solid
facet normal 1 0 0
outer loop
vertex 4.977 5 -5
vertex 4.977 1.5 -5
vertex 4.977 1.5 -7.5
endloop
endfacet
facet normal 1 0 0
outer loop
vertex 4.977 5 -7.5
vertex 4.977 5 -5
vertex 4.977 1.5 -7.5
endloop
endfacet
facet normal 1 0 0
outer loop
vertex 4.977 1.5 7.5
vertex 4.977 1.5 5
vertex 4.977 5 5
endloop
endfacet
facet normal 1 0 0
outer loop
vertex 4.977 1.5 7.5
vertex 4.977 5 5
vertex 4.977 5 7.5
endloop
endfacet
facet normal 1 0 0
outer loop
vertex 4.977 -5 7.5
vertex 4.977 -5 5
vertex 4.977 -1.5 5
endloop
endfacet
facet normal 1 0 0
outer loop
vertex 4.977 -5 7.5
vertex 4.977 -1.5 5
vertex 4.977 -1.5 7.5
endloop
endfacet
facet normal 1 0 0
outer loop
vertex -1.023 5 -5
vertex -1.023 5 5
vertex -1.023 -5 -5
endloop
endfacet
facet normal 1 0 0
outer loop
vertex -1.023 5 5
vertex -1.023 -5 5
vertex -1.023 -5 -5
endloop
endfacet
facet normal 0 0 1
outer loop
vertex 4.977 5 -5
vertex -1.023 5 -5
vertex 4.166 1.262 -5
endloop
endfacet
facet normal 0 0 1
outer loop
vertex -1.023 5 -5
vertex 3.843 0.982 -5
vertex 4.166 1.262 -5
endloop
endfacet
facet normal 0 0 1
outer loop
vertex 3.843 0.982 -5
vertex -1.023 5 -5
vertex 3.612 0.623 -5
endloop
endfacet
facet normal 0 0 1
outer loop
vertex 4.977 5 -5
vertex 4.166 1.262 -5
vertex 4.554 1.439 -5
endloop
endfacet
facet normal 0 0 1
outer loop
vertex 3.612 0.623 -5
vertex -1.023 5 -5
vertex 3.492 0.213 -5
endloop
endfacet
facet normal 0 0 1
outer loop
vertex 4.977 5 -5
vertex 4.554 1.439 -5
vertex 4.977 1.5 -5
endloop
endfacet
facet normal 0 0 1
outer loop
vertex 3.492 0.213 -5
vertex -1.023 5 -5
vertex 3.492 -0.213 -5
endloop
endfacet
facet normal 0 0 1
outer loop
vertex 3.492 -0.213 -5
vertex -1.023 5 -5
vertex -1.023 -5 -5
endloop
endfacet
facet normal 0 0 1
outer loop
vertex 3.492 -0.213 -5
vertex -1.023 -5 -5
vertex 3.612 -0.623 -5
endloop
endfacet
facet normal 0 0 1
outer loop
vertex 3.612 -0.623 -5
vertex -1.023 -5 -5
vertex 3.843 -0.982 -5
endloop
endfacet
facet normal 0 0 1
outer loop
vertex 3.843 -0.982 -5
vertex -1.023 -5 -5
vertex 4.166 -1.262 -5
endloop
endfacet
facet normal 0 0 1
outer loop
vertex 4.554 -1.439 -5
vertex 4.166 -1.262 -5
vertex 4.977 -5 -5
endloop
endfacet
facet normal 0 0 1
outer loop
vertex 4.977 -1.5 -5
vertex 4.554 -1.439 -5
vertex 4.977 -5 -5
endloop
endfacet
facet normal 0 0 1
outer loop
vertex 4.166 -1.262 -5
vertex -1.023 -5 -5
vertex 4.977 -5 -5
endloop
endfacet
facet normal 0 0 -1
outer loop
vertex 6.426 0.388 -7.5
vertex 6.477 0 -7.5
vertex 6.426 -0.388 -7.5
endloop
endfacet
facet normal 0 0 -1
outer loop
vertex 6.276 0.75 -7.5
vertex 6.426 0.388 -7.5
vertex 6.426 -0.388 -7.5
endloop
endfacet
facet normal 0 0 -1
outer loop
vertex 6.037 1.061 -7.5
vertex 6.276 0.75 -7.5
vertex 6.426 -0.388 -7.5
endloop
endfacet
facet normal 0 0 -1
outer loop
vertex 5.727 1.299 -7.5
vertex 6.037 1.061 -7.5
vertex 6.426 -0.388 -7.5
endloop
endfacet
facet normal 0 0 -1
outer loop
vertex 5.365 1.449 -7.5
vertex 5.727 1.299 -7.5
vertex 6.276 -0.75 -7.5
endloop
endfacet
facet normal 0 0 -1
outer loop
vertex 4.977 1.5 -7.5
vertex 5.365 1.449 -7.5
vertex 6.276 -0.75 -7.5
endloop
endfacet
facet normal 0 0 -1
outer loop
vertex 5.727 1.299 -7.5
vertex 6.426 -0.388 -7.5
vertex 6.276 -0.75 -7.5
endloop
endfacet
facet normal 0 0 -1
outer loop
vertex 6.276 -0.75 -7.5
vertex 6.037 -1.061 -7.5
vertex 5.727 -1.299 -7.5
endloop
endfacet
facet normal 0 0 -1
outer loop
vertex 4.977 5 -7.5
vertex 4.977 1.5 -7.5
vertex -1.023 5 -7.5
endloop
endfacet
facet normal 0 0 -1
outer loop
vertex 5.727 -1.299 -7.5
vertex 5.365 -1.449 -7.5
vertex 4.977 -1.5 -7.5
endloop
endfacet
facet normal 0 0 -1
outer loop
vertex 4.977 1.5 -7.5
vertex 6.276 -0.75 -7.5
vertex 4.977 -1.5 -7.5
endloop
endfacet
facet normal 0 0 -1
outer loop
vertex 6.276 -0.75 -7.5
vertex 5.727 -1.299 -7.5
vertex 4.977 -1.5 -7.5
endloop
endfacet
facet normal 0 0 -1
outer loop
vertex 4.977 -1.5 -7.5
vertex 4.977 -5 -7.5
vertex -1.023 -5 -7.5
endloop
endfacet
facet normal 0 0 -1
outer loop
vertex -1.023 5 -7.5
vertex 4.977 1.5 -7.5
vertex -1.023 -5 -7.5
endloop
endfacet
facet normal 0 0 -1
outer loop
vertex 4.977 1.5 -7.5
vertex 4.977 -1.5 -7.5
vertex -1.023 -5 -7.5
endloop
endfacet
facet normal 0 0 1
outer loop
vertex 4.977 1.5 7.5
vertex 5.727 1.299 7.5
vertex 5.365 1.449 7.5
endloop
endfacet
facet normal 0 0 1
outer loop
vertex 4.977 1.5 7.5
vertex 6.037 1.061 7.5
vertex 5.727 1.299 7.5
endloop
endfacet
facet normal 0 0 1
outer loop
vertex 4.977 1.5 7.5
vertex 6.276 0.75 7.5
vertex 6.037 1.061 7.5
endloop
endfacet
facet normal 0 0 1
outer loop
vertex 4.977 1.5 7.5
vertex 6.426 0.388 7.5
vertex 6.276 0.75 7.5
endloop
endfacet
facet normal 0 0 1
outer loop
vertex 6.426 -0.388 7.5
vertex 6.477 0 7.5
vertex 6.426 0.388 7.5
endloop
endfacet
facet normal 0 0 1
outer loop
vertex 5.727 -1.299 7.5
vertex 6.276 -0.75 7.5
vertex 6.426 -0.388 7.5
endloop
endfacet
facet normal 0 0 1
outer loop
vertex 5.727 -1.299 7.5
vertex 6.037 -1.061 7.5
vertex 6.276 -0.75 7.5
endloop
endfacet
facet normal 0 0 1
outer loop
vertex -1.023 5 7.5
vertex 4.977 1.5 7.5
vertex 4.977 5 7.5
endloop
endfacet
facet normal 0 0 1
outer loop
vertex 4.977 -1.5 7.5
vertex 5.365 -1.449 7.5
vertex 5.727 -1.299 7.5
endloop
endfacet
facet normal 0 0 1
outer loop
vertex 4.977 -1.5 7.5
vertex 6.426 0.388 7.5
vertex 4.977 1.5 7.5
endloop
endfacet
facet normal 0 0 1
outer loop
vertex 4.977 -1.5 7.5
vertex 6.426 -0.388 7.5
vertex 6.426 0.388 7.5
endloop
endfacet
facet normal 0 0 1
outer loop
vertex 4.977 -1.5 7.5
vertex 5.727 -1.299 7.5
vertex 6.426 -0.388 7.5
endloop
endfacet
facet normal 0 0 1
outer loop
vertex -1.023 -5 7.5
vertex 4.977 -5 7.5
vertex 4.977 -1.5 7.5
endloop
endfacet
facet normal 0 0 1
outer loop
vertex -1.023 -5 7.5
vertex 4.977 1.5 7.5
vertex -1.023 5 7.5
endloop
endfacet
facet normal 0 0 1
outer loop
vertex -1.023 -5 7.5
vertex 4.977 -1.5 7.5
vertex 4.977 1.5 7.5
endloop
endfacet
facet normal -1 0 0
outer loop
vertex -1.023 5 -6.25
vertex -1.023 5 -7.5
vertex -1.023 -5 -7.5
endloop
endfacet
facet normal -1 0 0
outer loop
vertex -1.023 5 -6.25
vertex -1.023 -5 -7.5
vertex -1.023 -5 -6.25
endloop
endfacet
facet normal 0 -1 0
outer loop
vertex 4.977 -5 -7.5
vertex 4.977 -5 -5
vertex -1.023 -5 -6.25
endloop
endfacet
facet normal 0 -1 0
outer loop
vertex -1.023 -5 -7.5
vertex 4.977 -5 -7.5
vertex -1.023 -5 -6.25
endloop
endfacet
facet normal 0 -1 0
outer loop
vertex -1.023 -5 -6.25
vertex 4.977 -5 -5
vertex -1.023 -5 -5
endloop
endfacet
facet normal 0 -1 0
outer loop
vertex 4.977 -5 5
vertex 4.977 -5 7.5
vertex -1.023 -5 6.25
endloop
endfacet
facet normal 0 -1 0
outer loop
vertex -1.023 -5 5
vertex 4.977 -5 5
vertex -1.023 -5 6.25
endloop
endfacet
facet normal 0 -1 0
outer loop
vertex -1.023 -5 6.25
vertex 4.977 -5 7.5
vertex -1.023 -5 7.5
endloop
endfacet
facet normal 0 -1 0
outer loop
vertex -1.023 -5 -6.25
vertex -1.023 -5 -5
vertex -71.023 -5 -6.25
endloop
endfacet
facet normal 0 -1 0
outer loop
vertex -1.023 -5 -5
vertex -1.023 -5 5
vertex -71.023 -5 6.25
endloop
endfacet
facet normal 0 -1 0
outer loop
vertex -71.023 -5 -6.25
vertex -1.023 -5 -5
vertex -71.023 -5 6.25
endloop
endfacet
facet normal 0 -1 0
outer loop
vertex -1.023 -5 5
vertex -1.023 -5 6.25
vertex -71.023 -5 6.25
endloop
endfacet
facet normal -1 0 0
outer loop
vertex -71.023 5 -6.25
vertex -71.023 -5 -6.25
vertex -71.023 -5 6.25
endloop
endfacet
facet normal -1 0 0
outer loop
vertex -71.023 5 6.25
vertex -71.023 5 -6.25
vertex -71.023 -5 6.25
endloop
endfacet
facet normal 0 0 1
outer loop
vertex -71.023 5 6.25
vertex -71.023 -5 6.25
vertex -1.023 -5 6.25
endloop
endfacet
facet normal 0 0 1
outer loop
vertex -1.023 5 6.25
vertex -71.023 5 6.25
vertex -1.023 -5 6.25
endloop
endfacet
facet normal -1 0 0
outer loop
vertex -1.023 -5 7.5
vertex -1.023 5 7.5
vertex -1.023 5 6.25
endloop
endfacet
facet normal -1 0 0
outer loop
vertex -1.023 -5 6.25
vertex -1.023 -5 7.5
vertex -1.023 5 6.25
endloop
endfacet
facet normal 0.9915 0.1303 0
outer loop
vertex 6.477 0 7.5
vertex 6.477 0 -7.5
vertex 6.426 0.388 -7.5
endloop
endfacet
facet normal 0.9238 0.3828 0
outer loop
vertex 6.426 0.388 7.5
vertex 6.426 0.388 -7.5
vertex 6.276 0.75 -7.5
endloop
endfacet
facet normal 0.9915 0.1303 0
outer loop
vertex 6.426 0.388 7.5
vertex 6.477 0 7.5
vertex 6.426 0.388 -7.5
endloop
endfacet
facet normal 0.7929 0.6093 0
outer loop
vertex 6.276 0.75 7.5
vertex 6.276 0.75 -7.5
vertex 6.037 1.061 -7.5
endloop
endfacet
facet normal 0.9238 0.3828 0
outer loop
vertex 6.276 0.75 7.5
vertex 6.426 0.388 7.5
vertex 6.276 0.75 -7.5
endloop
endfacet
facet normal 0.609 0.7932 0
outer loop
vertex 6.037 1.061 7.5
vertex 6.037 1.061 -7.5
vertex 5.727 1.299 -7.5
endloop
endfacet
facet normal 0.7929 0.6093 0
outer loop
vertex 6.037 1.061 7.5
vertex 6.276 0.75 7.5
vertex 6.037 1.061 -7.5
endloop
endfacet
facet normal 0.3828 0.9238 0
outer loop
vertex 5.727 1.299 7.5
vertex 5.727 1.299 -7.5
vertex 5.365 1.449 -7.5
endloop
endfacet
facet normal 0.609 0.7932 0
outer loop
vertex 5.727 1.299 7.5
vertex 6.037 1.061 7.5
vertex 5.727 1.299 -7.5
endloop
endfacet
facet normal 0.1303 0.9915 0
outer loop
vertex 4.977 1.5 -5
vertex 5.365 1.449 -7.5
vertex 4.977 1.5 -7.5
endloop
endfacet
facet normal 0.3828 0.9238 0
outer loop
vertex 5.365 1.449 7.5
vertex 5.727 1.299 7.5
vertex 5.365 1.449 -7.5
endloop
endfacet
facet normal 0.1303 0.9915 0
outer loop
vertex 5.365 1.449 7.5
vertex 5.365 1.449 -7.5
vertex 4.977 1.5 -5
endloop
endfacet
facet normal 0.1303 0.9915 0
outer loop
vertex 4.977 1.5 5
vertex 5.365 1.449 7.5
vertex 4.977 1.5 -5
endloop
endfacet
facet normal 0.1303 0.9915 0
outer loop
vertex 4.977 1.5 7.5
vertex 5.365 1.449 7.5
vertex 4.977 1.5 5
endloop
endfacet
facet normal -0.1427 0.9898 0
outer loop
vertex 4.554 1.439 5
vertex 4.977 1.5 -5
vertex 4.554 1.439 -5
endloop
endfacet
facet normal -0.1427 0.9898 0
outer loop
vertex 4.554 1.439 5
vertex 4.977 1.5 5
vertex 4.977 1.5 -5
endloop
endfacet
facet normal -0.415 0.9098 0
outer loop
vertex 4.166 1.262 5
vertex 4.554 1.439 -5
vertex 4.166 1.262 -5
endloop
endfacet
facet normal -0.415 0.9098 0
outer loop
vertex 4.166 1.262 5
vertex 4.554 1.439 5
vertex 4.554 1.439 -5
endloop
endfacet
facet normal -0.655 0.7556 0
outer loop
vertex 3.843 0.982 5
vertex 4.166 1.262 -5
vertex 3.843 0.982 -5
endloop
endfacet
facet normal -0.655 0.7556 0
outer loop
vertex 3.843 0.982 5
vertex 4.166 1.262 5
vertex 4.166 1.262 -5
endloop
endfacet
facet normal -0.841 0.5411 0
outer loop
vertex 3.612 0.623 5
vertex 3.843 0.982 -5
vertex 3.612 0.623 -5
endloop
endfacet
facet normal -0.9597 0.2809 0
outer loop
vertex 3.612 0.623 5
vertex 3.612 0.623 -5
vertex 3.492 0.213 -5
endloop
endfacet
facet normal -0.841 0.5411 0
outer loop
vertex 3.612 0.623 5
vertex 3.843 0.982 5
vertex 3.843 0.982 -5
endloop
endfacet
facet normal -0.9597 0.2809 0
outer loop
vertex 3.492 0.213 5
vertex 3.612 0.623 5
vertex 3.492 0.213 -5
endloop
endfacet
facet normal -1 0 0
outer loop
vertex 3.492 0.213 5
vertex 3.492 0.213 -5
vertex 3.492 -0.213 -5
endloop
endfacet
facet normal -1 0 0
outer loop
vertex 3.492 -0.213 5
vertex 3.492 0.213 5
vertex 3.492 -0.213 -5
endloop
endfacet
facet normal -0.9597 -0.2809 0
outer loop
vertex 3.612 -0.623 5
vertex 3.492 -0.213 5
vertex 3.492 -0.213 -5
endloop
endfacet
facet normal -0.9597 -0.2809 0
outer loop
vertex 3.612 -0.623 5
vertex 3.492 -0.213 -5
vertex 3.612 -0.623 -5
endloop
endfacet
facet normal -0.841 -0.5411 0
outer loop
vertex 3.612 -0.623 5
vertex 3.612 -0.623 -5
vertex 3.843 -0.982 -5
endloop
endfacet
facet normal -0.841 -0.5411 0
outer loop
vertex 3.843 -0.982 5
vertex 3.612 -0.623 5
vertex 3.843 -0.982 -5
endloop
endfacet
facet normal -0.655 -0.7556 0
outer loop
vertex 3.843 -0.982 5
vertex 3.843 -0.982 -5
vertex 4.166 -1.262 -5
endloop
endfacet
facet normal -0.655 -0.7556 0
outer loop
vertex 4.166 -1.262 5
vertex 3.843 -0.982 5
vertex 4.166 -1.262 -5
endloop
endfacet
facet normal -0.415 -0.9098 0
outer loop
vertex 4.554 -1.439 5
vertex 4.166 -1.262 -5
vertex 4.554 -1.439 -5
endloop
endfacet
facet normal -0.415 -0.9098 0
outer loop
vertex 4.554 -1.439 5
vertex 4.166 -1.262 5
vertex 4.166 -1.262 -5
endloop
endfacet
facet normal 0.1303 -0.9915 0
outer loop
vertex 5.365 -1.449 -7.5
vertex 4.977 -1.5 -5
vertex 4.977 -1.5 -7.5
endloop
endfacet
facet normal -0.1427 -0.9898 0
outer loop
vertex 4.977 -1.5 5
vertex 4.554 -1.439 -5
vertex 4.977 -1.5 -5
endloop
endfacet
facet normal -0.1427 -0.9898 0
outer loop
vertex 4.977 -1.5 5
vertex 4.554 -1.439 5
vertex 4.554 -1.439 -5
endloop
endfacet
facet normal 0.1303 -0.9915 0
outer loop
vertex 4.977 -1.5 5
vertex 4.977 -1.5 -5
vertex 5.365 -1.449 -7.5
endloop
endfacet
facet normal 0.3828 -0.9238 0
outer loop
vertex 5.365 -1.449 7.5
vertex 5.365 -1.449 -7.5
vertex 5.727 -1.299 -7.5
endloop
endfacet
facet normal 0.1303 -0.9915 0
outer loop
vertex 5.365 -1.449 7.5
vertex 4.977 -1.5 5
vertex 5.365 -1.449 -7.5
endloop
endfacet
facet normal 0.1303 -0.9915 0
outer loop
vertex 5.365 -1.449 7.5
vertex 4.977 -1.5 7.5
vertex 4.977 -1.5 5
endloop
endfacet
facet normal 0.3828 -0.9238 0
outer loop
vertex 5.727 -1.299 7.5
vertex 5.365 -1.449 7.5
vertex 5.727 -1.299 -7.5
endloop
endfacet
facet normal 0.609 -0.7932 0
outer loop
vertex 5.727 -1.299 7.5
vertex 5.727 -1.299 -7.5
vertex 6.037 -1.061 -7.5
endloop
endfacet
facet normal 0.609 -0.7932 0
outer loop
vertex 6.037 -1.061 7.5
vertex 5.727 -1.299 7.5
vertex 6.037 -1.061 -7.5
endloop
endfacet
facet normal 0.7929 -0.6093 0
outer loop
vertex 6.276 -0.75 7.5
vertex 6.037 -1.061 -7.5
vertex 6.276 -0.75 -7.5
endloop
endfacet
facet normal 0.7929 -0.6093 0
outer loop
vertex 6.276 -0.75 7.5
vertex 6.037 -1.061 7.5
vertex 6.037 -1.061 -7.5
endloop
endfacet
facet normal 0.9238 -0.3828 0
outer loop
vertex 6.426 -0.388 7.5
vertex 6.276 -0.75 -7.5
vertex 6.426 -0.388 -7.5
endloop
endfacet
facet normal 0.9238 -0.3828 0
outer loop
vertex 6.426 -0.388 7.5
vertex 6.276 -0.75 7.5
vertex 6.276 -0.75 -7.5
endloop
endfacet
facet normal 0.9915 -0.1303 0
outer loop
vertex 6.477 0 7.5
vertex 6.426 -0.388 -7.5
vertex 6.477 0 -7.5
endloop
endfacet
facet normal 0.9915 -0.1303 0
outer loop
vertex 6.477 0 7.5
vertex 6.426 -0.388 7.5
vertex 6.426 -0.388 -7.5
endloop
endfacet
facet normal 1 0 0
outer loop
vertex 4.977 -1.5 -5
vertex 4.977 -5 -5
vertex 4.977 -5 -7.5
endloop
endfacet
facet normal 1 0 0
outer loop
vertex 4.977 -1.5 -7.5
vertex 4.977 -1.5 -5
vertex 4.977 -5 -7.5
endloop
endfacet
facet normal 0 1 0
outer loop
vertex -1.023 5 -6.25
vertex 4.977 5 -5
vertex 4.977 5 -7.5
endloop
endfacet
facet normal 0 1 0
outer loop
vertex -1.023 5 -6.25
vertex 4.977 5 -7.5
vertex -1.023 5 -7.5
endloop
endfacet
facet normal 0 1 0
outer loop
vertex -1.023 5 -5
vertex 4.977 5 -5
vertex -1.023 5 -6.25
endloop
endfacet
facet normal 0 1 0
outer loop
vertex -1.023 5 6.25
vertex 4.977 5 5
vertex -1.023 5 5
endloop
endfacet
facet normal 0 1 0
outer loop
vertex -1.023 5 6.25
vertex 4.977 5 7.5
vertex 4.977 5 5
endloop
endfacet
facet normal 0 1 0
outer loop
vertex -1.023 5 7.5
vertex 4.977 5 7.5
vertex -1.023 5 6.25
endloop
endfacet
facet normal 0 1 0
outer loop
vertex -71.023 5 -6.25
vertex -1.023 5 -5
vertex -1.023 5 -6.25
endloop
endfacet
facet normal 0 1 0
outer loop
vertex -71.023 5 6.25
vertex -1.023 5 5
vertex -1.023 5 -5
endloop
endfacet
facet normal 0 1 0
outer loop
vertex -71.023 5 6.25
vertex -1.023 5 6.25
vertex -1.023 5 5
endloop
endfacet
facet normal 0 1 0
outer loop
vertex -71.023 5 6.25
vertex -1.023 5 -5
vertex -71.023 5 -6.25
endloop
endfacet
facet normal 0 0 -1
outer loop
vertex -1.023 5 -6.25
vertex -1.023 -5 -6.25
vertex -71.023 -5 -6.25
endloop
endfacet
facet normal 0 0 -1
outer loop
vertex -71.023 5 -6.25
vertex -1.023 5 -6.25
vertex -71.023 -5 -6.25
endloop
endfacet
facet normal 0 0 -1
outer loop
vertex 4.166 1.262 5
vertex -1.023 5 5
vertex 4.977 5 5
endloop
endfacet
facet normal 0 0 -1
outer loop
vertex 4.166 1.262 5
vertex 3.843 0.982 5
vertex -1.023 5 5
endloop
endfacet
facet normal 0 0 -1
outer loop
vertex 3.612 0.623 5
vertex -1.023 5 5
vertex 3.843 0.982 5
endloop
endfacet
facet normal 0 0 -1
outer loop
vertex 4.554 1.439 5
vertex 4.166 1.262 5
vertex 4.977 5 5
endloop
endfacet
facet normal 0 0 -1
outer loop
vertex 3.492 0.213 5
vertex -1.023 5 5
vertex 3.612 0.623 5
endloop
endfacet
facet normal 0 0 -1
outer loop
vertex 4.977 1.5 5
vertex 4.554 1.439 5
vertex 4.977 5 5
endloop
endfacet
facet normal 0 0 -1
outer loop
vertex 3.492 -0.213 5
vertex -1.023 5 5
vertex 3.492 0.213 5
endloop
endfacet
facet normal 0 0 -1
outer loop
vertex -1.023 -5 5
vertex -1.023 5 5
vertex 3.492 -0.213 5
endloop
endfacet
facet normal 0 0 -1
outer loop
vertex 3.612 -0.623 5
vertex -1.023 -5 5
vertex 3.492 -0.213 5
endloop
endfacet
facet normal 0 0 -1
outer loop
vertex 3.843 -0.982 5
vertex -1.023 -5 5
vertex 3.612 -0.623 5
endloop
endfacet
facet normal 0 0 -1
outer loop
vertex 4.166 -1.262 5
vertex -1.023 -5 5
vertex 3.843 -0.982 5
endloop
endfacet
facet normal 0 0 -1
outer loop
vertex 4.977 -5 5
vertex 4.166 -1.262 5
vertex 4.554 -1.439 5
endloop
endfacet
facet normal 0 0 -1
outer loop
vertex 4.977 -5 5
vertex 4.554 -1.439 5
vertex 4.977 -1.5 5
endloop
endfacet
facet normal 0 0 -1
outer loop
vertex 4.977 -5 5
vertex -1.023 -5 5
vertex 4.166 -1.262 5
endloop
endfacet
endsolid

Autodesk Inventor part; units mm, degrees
ref_plane "YZ Plane" through (0, 0, 0) normal (1, 0, 0) x (0, 1, 0)
ref_plane "XZ Plane" through (0, 0, 0) normal (0, 1, 0) x (-1, 0, 0)
ref_plane "XY Plane" through (0, 0, 0) normal (0, 0, 1) x (1, 0, 0)
sketch "草圖1" plane through (0, 0, 0) normal (0, 1, 0) x (-1, 0, 0)
  line L0 (71.0233, 6.25) -> (1.0233, 6.25)
  line L1 (1.0233, 6.25) -> (1.0233, -6.25)
  line L2 (1.0233, -6.25) -> (71.0233, -6.25)
  line L3 (71.0233, -6.25) -> (71.0233, 6.25)
  line L4 (1.0233, 5) -> (-4.9767, 5)
  line L5 (-4.9767, 5) -> (-4.9767, 7.5)
  line L6 (-4.9767, 7.5) -> (1.0233, 7.5)
  line L7 (1.0233, 7.5) -> (1.0233, 5)
  line L8 (1.0233, -5) -> (-4.9767, -5)
  line L9 (-4.9767, -5) -> (-4.9767, -7.5)
  line L10 (-4.9767, -7.5) -> (1.0233, -7.5)
  line L11 (1.0233, -7.5) -> (1.0233, -5)
  point P0 (0, 0)
  point P1 (1.0233, 6.25)
  dimension "d0" = 6
  dimension "d2" = 5
  dimension "d3" = 10
  dimension "d4" = 2.5
  dimension "d5" = 12.5
  dimension "d6" = 6.25
  dimension "d7" = 70
extrude "擠出1" add sketch "草圖1" along normal mid plane 10
sketch "草圖2" plane through (-1.0233, 5, 7.5) normal (0, 0, 1) x (1, 0, 0)
  line L0 (6, -10) -> (6, 0) projected
  circle A0 centre (6, -5) radius 1.5
  point P0 (1.0233, -5)
  dimension "d10" = 3
extrude "擠出2" add sketch "草圖2" against normal up to surface (15 mm away)
equation "\"d6\" = 0.5 * d5"
properties part number "axis_rf"
